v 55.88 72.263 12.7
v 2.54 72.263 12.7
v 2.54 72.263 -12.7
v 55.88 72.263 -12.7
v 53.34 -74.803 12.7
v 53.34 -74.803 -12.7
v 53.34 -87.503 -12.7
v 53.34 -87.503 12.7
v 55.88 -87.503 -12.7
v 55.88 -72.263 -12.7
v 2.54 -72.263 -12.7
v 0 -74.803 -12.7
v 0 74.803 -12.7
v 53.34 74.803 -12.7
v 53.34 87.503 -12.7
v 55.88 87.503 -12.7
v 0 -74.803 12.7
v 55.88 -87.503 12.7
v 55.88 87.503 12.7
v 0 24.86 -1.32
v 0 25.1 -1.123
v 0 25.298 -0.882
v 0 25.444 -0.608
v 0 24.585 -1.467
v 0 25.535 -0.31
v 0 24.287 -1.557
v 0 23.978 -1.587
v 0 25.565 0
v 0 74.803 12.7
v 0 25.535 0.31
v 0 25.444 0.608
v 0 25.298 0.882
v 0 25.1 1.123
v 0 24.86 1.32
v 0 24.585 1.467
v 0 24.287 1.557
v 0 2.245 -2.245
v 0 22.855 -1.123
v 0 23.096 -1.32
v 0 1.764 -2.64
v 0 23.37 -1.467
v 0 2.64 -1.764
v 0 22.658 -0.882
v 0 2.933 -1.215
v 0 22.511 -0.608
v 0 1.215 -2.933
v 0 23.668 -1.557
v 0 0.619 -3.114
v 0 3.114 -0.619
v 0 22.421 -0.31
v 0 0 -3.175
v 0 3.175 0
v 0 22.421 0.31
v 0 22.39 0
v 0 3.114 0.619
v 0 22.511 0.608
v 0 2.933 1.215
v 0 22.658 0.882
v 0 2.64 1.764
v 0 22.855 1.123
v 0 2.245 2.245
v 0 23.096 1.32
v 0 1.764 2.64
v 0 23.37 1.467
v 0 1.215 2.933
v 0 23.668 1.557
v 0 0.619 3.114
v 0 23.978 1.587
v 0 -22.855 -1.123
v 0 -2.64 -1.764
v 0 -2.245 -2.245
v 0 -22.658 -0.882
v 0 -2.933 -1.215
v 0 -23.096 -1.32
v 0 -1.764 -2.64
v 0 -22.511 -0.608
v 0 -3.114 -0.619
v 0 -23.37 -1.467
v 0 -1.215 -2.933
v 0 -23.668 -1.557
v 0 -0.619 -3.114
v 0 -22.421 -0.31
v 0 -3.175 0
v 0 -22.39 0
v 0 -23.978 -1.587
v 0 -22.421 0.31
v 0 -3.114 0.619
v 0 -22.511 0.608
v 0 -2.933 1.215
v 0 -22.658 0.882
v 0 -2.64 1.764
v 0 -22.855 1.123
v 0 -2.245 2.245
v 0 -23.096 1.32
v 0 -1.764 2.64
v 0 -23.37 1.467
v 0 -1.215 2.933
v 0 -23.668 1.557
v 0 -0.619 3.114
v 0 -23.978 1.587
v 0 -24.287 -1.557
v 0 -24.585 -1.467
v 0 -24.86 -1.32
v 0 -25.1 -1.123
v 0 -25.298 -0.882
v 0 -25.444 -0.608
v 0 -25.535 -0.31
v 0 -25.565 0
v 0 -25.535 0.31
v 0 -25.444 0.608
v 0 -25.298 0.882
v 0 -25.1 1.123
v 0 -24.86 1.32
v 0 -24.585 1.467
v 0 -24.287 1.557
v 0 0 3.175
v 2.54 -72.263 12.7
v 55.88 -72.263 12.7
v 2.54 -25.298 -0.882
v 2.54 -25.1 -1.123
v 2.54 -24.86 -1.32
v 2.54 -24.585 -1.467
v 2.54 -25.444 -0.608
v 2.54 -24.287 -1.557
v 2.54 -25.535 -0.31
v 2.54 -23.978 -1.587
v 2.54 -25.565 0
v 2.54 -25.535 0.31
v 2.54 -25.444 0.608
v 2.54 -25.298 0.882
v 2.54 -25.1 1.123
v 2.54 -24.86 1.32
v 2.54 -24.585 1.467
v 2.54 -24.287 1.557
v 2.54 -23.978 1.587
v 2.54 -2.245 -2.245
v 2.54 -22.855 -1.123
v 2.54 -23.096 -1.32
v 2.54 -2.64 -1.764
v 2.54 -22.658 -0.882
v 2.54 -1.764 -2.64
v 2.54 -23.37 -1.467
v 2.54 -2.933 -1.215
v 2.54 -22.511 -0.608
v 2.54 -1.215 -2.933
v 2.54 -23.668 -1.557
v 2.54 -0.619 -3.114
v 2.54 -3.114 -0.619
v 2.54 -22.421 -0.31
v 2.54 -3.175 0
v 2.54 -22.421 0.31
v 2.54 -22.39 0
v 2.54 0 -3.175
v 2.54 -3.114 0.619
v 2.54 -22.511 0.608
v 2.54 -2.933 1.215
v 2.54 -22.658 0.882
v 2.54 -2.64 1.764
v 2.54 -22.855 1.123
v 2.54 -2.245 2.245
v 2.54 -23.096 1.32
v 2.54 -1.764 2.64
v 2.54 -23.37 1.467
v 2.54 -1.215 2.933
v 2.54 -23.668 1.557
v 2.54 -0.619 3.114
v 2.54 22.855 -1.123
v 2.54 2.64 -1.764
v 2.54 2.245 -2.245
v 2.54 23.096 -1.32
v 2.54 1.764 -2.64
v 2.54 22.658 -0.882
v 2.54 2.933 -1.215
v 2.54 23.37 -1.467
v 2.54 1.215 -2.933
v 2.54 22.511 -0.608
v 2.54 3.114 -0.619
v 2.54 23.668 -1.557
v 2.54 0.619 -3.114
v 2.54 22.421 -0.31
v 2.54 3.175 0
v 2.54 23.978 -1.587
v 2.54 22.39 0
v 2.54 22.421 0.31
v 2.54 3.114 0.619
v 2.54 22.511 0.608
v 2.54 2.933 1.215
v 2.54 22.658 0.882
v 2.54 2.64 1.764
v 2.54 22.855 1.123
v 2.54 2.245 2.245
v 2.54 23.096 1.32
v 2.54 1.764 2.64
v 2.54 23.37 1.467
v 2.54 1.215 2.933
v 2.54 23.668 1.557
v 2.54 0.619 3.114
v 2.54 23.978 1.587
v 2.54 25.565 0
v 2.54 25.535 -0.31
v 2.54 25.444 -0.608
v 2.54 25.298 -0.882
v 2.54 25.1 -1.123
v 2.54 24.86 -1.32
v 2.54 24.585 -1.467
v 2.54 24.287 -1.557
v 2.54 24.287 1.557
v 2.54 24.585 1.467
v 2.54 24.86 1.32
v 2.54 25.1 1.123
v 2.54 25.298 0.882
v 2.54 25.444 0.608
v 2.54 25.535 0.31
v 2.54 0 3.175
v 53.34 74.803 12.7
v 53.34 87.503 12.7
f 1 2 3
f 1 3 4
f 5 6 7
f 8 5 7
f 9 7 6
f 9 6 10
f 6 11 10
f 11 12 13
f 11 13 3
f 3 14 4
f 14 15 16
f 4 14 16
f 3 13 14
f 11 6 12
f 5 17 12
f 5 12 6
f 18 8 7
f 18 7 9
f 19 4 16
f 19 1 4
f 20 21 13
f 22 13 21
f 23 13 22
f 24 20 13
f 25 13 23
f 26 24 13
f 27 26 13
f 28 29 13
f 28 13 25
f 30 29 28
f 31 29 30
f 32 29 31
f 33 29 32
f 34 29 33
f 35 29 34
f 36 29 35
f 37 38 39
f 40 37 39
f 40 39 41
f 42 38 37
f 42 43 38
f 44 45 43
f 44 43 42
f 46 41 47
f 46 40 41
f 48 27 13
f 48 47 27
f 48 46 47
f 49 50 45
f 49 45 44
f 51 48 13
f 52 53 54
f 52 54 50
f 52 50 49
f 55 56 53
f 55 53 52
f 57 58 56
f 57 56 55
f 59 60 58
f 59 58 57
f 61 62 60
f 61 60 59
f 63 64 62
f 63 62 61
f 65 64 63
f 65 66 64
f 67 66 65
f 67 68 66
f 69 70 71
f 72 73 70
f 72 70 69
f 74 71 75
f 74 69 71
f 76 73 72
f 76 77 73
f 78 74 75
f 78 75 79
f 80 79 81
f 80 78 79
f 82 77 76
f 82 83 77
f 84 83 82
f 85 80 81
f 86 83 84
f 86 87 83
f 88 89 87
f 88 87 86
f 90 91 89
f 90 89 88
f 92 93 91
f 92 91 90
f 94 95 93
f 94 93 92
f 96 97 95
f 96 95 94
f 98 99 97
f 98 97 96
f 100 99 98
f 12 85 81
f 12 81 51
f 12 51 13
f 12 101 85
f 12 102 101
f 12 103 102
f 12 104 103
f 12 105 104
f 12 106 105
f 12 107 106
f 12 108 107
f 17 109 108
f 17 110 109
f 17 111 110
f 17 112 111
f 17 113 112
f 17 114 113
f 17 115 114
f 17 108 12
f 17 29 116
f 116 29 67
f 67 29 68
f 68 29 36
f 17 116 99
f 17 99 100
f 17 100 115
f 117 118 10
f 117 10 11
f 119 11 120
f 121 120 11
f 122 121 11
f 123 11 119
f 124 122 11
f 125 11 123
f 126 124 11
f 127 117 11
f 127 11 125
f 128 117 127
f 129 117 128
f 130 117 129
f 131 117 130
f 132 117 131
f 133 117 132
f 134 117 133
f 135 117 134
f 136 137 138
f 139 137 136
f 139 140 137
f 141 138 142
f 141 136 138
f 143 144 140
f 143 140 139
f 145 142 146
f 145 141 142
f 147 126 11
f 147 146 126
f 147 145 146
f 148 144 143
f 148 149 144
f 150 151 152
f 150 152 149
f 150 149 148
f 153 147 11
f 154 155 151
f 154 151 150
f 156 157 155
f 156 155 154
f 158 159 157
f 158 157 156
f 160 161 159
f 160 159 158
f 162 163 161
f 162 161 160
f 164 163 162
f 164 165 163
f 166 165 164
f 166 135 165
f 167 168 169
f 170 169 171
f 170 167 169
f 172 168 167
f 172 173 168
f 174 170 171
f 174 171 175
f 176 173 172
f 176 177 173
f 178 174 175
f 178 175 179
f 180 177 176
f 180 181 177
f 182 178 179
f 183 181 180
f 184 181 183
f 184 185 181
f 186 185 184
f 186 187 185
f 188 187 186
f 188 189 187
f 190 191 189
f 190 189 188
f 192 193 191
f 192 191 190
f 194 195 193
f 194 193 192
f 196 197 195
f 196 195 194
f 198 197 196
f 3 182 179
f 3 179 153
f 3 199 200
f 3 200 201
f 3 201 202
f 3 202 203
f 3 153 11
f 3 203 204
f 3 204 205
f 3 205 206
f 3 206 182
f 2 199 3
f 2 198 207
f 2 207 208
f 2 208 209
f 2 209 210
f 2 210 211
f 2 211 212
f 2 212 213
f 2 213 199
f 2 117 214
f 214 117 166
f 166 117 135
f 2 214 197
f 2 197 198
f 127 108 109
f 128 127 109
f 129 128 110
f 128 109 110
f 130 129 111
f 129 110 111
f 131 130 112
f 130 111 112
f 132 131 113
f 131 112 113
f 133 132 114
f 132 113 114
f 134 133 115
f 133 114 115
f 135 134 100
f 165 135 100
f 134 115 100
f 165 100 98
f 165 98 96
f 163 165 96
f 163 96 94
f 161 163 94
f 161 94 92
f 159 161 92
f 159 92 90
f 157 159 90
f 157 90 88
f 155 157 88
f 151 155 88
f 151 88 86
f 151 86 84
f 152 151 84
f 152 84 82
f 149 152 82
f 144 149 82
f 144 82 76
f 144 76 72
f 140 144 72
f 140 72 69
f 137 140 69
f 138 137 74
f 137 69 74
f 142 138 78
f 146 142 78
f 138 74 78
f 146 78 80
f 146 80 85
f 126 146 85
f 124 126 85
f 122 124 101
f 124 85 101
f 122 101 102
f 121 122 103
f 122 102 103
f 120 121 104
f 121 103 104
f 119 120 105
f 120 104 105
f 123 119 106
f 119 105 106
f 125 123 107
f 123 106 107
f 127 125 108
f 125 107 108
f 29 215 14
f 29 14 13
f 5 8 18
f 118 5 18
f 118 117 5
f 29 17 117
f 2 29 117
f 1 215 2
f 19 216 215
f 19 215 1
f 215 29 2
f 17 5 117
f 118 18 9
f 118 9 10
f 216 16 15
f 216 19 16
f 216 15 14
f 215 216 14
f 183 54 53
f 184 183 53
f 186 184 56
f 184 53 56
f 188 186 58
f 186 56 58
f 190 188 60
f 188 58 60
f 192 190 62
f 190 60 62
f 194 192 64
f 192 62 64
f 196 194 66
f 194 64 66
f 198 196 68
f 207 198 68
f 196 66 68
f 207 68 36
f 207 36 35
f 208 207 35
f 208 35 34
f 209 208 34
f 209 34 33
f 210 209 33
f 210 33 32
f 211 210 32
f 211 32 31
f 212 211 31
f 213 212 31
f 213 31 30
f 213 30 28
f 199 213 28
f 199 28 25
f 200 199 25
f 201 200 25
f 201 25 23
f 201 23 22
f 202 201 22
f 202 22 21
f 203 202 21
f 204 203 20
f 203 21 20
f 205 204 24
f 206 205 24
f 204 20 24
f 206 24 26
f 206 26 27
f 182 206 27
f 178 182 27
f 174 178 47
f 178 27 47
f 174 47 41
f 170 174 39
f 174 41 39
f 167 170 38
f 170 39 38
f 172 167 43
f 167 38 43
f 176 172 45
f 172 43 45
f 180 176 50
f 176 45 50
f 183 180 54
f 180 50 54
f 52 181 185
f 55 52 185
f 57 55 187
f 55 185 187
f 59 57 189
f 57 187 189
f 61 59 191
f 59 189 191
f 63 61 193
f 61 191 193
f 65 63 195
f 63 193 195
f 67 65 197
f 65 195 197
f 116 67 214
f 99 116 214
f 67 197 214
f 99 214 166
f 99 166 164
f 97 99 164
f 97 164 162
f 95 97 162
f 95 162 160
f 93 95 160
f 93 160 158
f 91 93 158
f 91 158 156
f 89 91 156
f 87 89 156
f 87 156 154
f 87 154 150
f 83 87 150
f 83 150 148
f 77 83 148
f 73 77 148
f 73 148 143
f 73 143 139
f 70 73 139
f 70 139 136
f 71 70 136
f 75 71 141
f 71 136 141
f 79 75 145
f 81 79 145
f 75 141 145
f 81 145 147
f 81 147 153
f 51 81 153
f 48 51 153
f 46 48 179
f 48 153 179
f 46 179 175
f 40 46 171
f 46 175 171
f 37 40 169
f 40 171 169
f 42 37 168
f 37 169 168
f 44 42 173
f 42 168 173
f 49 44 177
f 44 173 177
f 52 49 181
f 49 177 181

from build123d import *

# Parameters (mm, degrees)
BASE_EXTRUDE_THIN_DEPTH = 12.7
SKETCH2_R               = 3.175
CUT_EXTRUDE1_DEPTH      = 104.262871396
SKETCH3_R               = 1.587498625
CUT_EXTRUDE2_DEPTH      = 105.597511486
SKETCH4_R               = 1.587498625
CUT_EXTRUDE3_DEPTH      = 105.597511486


with BuildPart() as part:
    # Sketch1 → Base-Extrude-Thin (new, symmetric)
    with BuildSketch(Plane.XY):
        Polygon((53.34, 87.503), (53.34, 74.803), (0, 74.803), (0, -74.803), (53.34, -74.803), (53.34, -87.503), (55.88, -87.503), (55.88, -72.263), (2.54, -72.263), (2.54, 72.263), (55.88, 72.263), (55.88, 87.503), align=None)
    extrude(amount=BASE_EXTRUDE_THIN_DEPTH, both=True)

    # Sketch2 → Cut-Extrude1 (cut, through all)
    with BuildSketch(Plane(origin=(2.54, 0, 0), x_dir=(0, 0, -1), z_dir=(1, 0, 0))):
        with Locations(Location((0, 0, 0), (0, 0, 90))):
            Circle(SKETCH2_R)
    extrude(amount=-CUT_EXTRUDE1_DEPTH, mode=Mode.SUBTRACT)

    # Sketch3 → Cut-Extrude2 (cut, through all)
    with BuildSketch(Plane.ZY):
        with Locations(Location((0, 23.9776, 0), (0, 0, 270))):
            Circle(SKETCH3_R)
    extrude(amount=-CUT_EXTRUDE2_DEPTH, mode=Mode.SUBTRACT)

    # Sketch4 → Cut-Extrude3 (cut, through all)
    with BuildSketch(Plane.ZY):
        with Locations(Location((0, -23.9776, 0), (0, 0, 270))):
            Circle(SKETCH4_R)
    extrude(amount=-CUT_EXTRUDE3_DEPTH, mode=Mode.SUBTRACT)


solid = part.part
